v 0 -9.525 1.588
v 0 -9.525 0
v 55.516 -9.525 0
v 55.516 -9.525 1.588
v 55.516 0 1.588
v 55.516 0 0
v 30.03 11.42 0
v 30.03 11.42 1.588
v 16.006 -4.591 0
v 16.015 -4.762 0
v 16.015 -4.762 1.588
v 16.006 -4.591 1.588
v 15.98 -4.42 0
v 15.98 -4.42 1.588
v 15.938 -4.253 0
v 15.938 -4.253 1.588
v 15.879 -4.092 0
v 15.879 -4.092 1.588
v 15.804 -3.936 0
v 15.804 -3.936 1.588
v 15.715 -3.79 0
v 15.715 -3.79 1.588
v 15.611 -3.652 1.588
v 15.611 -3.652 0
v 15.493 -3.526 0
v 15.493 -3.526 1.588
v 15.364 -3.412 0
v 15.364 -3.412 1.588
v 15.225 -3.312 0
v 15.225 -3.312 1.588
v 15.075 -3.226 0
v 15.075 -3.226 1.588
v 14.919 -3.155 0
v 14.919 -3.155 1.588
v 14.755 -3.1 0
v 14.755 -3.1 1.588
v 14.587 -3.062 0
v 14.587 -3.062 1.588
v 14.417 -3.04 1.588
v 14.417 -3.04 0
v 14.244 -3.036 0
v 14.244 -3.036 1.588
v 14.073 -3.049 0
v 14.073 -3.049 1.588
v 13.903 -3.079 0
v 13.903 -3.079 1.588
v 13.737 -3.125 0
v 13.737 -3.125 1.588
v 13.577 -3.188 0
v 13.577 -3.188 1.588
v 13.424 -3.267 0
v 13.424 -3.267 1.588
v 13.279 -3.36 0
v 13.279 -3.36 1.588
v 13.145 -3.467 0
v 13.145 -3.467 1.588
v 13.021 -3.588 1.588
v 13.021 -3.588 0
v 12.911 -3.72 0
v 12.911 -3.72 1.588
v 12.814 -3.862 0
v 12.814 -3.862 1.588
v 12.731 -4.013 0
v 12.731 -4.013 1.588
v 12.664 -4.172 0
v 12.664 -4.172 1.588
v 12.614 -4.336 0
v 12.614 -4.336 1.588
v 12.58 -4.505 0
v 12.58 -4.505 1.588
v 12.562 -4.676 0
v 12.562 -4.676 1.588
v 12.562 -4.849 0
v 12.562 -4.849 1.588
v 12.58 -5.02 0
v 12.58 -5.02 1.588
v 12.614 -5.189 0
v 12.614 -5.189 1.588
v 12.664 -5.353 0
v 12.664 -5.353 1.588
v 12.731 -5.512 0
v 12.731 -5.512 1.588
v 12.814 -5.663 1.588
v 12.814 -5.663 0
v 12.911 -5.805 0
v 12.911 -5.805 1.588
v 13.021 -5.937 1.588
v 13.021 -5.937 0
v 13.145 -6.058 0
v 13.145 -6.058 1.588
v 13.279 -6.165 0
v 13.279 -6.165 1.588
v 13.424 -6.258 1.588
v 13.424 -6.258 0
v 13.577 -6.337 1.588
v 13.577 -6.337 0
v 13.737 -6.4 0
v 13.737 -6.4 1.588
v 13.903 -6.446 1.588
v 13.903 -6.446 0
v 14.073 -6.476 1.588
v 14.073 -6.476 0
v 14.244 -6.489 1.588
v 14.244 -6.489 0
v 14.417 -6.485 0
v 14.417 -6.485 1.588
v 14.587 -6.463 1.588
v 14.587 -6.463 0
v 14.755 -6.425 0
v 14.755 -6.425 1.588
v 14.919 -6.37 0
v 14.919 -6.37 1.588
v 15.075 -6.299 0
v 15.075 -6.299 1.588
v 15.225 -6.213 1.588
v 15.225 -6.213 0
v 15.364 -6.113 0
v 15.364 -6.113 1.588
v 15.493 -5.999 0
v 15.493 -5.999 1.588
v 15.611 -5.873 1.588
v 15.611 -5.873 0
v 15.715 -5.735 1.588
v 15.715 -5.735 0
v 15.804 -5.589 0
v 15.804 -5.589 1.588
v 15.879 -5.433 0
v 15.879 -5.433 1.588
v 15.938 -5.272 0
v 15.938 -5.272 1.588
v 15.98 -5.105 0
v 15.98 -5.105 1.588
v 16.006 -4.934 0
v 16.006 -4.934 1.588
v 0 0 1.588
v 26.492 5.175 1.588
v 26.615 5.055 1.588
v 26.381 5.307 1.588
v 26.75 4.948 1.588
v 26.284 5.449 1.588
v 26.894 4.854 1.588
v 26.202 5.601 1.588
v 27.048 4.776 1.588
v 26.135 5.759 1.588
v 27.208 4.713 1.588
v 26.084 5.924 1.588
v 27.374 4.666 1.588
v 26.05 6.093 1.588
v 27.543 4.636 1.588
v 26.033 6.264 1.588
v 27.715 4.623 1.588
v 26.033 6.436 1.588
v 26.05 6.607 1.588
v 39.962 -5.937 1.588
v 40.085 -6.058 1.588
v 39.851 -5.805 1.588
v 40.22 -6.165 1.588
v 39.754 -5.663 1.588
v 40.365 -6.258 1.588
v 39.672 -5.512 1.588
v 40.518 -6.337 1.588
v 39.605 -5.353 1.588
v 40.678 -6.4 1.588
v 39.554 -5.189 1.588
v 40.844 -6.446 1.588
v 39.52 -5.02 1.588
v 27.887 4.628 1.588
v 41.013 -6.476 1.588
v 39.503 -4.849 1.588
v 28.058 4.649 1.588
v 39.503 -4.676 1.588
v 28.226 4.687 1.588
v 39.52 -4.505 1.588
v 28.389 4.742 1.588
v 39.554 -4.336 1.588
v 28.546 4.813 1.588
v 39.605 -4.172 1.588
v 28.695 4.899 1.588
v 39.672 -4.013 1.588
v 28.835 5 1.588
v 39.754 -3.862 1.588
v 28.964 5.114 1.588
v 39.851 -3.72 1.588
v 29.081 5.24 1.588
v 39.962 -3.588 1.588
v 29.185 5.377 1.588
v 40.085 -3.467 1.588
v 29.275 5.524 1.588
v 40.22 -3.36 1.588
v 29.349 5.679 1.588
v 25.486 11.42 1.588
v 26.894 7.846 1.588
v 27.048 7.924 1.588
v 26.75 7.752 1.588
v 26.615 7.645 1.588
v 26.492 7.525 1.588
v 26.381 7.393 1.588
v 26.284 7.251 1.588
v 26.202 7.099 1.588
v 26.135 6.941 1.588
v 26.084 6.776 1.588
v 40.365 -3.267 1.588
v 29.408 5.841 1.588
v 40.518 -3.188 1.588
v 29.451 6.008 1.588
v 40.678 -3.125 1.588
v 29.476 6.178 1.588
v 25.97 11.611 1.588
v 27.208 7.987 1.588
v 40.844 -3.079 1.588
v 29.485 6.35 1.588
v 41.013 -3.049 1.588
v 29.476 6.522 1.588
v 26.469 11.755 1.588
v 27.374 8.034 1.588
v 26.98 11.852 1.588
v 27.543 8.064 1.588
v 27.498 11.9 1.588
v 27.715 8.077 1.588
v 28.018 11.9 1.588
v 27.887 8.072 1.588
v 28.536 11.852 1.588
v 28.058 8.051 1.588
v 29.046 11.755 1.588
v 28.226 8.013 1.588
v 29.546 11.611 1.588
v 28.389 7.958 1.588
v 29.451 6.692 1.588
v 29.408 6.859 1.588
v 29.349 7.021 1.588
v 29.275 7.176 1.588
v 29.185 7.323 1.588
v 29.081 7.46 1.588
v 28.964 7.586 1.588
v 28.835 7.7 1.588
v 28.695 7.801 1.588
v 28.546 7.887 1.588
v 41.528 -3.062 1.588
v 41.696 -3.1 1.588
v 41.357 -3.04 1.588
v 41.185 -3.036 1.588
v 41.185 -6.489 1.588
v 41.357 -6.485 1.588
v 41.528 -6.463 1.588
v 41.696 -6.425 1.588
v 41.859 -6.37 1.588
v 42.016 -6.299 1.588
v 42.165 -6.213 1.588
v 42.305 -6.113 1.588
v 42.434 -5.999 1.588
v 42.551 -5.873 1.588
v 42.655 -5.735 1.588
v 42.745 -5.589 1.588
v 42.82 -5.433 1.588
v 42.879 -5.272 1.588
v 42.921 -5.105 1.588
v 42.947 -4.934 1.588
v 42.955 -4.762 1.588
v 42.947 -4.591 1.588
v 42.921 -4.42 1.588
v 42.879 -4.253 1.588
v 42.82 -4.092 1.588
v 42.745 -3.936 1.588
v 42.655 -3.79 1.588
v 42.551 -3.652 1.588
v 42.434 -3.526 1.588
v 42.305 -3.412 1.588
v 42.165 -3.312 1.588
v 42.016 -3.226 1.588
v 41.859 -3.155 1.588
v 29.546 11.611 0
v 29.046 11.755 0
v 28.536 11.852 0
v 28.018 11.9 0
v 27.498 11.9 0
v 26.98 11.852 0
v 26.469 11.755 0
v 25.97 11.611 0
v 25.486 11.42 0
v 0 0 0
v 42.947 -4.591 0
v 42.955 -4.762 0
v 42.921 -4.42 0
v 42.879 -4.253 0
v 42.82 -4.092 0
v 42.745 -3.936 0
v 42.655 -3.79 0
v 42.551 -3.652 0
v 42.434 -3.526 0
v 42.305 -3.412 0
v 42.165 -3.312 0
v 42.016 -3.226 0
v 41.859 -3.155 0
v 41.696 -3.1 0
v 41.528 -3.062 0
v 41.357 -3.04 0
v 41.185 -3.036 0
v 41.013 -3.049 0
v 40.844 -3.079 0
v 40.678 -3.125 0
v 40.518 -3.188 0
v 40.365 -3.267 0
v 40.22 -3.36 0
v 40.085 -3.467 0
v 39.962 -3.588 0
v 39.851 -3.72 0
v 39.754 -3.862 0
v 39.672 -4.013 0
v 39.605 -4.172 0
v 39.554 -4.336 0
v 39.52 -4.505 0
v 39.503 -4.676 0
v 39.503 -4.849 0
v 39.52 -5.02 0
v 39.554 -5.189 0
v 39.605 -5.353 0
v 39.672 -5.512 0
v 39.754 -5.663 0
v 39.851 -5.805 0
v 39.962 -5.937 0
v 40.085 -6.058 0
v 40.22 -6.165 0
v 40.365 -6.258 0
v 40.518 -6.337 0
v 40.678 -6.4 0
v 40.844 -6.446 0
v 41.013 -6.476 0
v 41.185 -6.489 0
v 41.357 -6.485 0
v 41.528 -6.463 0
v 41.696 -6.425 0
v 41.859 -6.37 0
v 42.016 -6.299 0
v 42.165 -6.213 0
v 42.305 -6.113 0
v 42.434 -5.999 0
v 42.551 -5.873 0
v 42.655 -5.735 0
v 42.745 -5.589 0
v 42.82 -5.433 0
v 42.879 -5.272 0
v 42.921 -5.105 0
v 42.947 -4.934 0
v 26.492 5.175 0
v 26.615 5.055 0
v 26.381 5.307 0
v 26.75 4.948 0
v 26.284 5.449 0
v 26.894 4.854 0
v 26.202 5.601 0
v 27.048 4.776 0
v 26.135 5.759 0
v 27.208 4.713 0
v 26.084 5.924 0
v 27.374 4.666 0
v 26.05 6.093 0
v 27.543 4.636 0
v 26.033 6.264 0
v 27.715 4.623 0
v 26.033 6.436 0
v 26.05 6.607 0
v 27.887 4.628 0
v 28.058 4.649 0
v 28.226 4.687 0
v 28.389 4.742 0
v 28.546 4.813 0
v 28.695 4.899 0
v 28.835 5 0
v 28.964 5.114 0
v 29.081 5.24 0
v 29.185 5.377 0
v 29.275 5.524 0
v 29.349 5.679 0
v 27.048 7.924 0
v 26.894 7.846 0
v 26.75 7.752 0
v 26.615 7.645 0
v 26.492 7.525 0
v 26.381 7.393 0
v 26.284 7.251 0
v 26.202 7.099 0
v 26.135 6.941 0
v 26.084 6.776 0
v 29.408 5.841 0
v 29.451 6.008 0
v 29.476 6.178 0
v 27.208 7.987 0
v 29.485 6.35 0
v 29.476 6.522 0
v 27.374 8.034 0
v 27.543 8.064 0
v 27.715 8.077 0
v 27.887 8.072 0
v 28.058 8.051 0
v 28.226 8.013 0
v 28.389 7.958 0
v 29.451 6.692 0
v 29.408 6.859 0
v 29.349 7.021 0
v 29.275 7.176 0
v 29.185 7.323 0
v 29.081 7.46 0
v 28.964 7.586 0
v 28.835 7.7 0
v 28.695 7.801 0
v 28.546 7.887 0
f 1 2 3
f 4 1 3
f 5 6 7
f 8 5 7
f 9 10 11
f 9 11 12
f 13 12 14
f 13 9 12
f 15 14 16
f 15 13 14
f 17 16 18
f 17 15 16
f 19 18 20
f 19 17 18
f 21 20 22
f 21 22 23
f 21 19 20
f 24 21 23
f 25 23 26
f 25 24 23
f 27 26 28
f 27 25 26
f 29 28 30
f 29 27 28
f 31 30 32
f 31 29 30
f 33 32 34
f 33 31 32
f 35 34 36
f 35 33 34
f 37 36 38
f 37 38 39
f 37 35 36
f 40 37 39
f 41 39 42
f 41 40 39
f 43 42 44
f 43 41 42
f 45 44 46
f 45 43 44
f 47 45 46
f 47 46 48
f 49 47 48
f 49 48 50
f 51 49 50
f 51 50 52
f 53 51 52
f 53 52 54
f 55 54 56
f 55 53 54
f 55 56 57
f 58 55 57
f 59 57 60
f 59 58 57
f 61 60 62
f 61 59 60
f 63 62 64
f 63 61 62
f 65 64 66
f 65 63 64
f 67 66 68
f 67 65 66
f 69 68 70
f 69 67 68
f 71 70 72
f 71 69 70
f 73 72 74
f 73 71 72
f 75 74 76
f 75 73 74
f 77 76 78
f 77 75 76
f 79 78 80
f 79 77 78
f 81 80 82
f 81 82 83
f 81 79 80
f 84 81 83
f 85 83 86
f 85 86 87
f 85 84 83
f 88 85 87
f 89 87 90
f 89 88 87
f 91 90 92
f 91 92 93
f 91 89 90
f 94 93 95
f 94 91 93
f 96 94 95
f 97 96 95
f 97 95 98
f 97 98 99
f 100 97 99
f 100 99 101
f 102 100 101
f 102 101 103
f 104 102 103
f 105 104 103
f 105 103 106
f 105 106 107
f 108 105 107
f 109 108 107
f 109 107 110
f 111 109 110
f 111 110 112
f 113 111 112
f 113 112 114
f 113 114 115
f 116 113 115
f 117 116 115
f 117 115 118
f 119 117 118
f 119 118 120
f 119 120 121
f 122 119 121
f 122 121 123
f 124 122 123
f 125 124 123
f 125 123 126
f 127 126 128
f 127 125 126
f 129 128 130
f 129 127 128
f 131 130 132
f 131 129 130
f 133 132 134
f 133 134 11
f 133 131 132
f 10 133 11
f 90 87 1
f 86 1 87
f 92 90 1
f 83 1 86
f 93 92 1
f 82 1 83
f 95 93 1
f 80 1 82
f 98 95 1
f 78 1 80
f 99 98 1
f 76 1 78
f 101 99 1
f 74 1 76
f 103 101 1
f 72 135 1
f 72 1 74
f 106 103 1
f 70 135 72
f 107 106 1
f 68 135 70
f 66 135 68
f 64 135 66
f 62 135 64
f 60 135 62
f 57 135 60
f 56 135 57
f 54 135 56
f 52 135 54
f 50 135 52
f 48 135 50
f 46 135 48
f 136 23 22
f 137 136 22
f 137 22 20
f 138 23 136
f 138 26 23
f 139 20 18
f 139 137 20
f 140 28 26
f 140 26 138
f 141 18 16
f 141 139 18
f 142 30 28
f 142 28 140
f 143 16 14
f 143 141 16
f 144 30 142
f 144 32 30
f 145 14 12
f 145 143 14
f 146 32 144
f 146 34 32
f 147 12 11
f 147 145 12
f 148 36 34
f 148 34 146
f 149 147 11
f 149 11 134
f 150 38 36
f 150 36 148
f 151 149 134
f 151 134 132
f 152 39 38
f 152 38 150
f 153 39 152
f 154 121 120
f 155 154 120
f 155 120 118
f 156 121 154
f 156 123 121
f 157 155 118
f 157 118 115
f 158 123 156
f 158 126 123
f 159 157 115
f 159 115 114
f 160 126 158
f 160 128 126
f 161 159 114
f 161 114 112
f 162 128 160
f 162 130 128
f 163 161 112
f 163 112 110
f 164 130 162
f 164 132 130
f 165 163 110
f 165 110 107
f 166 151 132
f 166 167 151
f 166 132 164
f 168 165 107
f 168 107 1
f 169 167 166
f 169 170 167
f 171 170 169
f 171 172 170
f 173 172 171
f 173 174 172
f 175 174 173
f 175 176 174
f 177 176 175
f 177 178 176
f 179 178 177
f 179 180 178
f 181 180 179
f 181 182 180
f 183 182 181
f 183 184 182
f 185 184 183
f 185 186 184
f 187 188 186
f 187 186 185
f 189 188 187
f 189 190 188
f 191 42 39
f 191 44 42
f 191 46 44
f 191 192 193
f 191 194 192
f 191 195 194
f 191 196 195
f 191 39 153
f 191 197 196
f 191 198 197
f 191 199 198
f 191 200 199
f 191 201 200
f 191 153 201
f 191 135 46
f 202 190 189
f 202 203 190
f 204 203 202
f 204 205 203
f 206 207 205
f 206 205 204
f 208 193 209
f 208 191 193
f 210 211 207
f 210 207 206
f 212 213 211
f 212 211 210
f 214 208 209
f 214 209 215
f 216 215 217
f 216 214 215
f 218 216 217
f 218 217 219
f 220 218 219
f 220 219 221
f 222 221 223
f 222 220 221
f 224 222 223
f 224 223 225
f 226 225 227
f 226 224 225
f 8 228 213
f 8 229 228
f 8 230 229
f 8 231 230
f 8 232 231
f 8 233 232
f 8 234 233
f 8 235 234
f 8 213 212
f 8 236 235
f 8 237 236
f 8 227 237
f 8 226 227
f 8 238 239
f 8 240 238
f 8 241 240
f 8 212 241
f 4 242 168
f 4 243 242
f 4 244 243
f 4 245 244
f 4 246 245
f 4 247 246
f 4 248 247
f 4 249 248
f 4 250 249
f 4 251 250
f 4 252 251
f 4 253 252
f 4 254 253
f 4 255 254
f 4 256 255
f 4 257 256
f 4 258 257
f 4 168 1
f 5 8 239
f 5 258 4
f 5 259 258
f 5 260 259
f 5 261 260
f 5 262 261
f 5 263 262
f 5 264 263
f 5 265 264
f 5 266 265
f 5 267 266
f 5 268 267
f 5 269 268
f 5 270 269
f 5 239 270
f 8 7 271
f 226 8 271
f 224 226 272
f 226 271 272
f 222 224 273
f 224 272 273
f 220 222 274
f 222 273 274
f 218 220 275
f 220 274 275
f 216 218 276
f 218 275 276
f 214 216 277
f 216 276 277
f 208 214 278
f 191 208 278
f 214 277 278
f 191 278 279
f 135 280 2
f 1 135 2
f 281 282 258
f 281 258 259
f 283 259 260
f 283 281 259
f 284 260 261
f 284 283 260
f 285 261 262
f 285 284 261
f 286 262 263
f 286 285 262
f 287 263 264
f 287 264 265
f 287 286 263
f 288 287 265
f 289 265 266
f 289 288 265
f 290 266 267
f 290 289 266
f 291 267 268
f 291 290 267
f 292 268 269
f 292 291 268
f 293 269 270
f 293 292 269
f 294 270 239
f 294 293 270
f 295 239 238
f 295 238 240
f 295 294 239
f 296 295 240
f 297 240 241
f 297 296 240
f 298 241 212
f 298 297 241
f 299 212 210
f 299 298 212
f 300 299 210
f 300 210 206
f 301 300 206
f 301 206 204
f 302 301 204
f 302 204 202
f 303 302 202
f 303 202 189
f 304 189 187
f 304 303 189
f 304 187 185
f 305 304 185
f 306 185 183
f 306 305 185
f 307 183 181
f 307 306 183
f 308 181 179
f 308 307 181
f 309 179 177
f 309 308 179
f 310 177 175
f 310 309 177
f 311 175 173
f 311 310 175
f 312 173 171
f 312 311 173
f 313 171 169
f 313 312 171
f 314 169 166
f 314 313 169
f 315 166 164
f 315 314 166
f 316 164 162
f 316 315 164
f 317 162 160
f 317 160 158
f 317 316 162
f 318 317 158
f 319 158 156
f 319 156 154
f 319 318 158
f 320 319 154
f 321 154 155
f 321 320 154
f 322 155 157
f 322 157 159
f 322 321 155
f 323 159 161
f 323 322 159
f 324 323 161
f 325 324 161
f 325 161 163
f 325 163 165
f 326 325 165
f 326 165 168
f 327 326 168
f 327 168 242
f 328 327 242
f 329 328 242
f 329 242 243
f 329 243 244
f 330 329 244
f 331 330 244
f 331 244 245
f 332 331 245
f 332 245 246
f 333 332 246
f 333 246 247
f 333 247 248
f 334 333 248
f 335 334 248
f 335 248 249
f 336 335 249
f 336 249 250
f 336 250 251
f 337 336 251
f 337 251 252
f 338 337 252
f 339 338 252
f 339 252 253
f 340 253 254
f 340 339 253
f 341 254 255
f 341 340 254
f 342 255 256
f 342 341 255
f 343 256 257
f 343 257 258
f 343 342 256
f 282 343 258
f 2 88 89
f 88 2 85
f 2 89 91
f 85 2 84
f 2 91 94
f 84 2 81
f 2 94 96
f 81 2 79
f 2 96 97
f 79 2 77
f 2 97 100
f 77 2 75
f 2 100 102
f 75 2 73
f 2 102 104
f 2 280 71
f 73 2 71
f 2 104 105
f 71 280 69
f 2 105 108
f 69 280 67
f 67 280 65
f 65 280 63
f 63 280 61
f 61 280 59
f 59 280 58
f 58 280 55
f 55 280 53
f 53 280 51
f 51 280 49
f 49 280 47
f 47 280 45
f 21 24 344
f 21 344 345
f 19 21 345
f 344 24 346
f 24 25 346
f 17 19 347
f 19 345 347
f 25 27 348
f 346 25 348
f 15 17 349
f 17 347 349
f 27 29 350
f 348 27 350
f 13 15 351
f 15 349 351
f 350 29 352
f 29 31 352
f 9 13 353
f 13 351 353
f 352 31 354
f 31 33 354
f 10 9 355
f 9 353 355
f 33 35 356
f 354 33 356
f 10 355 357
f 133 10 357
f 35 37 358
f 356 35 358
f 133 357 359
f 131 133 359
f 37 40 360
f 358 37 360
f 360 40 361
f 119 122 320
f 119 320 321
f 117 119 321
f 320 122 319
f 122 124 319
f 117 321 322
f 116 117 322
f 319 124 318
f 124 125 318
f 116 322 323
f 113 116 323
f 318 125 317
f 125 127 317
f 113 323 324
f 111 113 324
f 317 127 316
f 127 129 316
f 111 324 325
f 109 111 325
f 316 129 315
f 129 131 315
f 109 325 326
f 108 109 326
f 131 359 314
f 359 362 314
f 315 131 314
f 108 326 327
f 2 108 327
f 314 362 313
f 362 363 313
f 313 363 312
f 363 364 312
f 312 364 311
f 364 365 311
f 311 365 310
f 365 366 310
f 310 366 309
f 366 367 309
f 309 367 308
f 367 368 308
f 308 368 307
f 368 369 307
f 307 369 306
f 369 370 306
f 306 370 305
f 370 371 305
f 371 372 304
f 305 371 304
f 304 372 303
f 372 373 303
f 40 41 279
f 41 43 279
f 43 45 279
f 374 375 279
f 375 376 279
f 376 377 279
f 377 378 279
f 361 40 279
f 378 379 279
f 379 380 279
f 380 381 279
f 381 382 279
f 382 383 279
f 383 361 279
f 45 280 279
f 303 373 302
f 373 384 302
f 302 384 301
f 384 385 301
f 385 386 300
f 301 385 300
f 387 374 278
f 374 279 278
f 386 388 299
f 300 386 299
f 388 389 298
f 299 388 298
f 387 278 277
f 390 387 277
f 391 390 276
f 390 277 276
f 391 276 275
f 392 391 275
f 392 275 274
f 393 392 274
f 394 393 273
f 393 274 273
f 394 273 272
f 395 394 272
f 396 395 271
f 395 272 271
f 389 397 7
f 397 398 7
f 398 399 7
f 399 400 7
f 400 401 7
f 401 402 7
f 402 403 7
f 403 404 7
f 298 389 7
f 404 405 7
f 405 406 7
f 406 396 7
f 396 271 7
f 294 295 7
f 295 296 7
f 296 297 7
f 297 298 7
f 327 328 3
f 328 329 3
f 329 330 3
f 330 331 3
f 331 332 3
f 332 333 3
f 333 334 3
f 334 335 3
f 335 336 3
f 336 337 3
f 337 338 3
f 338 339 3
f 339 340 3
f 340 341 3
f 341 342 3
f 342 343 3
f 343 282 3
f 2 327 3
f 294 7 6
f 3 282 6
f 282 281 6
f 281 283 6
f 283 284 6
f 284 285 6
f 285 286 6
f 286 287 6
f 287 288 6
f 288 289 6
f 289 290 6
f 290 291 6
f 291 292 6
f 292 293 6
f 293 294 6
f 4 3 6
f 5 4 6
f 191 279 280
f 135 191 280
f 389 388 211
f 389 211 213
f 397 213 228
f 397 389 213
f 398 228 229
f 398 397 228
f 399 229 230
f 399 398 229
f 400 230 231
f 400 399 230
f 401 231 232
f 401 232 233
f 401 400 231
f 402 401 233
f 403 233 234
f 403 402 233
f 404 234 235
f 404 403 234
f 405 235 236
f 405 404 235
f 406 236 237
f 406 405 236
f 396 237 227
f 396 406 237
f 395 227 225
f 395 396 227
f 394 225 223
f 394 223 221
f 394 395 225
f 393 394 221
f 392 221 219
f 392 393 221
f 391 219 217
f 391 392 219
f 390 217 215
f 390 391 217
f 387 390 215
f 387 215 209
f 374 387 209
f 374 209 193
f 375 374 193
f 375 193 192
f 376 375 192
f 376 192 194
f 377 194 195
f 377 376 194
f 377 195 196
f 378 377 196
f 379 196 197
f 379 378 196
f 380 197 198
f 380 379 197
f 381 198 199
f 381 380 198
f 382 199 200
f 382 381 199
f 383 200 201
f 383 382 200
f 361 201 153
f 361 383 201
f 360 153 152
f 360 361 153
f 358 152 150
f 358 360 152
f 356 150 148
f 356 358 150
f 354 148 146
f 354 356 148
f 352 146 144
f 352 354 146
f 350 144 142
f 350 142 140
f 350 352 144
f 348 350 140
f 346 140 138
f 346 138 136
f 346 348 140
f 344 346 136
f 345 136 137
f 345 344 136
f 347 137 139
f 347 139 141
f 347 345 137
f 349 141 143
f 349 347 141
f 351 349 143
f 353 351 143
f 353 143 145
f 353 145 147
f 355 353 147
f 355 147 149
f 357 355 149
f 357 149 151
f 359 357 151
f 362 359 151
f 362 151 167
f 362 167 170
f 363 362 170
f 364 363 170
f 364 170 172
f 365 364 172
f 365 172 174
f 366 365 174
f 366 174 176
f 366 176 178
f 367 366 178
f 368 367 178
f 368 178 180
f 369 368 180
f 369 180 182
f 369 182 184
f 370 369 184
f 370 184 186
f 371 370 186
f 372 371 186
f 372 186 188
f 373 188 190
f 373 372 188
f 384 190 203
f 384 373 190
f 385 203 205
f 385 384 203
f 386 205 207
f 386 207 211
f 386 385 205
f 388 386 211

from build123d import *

# Parameters (mm, degrees)
F0_R     = 1.7272
F1_DEPTH = 1.5875


with BuildPart() as f1:
    # F0 (on Top) → F1 (new body)
    with BuildSketch(Plane.XY):
        with BuildLine():
            Line((0, 0), (0, -9.525))
            Line((0, -9.525), (55.515764, -9.525))
            Line((55.515764, -9.525), (55.515764, 0))
            Line((55.515764, 0), (30.030001, 11.420443))
            ThreePointArc((30.030001, 11.420443), (27.757882, 11.90625), (25.485763, 11.420443))
            Line((25.485763, 11.420443), (0, 0))
        make_face()
        with Locations((14.2875, -4.7625)):
            Circle(F0_R, mode=Mode.SUBTRACT)
        with Locations((41.228264, -4.7625)):
            Circle(F0_R, mode=Mode.SUBTRACT)
        with Locations((27.757882, 6.35)):
            Circle(F0_R, mode=Mode.SUBTRACT)
    extrude(amount=F1_DEPTH)


solid = f1.part
